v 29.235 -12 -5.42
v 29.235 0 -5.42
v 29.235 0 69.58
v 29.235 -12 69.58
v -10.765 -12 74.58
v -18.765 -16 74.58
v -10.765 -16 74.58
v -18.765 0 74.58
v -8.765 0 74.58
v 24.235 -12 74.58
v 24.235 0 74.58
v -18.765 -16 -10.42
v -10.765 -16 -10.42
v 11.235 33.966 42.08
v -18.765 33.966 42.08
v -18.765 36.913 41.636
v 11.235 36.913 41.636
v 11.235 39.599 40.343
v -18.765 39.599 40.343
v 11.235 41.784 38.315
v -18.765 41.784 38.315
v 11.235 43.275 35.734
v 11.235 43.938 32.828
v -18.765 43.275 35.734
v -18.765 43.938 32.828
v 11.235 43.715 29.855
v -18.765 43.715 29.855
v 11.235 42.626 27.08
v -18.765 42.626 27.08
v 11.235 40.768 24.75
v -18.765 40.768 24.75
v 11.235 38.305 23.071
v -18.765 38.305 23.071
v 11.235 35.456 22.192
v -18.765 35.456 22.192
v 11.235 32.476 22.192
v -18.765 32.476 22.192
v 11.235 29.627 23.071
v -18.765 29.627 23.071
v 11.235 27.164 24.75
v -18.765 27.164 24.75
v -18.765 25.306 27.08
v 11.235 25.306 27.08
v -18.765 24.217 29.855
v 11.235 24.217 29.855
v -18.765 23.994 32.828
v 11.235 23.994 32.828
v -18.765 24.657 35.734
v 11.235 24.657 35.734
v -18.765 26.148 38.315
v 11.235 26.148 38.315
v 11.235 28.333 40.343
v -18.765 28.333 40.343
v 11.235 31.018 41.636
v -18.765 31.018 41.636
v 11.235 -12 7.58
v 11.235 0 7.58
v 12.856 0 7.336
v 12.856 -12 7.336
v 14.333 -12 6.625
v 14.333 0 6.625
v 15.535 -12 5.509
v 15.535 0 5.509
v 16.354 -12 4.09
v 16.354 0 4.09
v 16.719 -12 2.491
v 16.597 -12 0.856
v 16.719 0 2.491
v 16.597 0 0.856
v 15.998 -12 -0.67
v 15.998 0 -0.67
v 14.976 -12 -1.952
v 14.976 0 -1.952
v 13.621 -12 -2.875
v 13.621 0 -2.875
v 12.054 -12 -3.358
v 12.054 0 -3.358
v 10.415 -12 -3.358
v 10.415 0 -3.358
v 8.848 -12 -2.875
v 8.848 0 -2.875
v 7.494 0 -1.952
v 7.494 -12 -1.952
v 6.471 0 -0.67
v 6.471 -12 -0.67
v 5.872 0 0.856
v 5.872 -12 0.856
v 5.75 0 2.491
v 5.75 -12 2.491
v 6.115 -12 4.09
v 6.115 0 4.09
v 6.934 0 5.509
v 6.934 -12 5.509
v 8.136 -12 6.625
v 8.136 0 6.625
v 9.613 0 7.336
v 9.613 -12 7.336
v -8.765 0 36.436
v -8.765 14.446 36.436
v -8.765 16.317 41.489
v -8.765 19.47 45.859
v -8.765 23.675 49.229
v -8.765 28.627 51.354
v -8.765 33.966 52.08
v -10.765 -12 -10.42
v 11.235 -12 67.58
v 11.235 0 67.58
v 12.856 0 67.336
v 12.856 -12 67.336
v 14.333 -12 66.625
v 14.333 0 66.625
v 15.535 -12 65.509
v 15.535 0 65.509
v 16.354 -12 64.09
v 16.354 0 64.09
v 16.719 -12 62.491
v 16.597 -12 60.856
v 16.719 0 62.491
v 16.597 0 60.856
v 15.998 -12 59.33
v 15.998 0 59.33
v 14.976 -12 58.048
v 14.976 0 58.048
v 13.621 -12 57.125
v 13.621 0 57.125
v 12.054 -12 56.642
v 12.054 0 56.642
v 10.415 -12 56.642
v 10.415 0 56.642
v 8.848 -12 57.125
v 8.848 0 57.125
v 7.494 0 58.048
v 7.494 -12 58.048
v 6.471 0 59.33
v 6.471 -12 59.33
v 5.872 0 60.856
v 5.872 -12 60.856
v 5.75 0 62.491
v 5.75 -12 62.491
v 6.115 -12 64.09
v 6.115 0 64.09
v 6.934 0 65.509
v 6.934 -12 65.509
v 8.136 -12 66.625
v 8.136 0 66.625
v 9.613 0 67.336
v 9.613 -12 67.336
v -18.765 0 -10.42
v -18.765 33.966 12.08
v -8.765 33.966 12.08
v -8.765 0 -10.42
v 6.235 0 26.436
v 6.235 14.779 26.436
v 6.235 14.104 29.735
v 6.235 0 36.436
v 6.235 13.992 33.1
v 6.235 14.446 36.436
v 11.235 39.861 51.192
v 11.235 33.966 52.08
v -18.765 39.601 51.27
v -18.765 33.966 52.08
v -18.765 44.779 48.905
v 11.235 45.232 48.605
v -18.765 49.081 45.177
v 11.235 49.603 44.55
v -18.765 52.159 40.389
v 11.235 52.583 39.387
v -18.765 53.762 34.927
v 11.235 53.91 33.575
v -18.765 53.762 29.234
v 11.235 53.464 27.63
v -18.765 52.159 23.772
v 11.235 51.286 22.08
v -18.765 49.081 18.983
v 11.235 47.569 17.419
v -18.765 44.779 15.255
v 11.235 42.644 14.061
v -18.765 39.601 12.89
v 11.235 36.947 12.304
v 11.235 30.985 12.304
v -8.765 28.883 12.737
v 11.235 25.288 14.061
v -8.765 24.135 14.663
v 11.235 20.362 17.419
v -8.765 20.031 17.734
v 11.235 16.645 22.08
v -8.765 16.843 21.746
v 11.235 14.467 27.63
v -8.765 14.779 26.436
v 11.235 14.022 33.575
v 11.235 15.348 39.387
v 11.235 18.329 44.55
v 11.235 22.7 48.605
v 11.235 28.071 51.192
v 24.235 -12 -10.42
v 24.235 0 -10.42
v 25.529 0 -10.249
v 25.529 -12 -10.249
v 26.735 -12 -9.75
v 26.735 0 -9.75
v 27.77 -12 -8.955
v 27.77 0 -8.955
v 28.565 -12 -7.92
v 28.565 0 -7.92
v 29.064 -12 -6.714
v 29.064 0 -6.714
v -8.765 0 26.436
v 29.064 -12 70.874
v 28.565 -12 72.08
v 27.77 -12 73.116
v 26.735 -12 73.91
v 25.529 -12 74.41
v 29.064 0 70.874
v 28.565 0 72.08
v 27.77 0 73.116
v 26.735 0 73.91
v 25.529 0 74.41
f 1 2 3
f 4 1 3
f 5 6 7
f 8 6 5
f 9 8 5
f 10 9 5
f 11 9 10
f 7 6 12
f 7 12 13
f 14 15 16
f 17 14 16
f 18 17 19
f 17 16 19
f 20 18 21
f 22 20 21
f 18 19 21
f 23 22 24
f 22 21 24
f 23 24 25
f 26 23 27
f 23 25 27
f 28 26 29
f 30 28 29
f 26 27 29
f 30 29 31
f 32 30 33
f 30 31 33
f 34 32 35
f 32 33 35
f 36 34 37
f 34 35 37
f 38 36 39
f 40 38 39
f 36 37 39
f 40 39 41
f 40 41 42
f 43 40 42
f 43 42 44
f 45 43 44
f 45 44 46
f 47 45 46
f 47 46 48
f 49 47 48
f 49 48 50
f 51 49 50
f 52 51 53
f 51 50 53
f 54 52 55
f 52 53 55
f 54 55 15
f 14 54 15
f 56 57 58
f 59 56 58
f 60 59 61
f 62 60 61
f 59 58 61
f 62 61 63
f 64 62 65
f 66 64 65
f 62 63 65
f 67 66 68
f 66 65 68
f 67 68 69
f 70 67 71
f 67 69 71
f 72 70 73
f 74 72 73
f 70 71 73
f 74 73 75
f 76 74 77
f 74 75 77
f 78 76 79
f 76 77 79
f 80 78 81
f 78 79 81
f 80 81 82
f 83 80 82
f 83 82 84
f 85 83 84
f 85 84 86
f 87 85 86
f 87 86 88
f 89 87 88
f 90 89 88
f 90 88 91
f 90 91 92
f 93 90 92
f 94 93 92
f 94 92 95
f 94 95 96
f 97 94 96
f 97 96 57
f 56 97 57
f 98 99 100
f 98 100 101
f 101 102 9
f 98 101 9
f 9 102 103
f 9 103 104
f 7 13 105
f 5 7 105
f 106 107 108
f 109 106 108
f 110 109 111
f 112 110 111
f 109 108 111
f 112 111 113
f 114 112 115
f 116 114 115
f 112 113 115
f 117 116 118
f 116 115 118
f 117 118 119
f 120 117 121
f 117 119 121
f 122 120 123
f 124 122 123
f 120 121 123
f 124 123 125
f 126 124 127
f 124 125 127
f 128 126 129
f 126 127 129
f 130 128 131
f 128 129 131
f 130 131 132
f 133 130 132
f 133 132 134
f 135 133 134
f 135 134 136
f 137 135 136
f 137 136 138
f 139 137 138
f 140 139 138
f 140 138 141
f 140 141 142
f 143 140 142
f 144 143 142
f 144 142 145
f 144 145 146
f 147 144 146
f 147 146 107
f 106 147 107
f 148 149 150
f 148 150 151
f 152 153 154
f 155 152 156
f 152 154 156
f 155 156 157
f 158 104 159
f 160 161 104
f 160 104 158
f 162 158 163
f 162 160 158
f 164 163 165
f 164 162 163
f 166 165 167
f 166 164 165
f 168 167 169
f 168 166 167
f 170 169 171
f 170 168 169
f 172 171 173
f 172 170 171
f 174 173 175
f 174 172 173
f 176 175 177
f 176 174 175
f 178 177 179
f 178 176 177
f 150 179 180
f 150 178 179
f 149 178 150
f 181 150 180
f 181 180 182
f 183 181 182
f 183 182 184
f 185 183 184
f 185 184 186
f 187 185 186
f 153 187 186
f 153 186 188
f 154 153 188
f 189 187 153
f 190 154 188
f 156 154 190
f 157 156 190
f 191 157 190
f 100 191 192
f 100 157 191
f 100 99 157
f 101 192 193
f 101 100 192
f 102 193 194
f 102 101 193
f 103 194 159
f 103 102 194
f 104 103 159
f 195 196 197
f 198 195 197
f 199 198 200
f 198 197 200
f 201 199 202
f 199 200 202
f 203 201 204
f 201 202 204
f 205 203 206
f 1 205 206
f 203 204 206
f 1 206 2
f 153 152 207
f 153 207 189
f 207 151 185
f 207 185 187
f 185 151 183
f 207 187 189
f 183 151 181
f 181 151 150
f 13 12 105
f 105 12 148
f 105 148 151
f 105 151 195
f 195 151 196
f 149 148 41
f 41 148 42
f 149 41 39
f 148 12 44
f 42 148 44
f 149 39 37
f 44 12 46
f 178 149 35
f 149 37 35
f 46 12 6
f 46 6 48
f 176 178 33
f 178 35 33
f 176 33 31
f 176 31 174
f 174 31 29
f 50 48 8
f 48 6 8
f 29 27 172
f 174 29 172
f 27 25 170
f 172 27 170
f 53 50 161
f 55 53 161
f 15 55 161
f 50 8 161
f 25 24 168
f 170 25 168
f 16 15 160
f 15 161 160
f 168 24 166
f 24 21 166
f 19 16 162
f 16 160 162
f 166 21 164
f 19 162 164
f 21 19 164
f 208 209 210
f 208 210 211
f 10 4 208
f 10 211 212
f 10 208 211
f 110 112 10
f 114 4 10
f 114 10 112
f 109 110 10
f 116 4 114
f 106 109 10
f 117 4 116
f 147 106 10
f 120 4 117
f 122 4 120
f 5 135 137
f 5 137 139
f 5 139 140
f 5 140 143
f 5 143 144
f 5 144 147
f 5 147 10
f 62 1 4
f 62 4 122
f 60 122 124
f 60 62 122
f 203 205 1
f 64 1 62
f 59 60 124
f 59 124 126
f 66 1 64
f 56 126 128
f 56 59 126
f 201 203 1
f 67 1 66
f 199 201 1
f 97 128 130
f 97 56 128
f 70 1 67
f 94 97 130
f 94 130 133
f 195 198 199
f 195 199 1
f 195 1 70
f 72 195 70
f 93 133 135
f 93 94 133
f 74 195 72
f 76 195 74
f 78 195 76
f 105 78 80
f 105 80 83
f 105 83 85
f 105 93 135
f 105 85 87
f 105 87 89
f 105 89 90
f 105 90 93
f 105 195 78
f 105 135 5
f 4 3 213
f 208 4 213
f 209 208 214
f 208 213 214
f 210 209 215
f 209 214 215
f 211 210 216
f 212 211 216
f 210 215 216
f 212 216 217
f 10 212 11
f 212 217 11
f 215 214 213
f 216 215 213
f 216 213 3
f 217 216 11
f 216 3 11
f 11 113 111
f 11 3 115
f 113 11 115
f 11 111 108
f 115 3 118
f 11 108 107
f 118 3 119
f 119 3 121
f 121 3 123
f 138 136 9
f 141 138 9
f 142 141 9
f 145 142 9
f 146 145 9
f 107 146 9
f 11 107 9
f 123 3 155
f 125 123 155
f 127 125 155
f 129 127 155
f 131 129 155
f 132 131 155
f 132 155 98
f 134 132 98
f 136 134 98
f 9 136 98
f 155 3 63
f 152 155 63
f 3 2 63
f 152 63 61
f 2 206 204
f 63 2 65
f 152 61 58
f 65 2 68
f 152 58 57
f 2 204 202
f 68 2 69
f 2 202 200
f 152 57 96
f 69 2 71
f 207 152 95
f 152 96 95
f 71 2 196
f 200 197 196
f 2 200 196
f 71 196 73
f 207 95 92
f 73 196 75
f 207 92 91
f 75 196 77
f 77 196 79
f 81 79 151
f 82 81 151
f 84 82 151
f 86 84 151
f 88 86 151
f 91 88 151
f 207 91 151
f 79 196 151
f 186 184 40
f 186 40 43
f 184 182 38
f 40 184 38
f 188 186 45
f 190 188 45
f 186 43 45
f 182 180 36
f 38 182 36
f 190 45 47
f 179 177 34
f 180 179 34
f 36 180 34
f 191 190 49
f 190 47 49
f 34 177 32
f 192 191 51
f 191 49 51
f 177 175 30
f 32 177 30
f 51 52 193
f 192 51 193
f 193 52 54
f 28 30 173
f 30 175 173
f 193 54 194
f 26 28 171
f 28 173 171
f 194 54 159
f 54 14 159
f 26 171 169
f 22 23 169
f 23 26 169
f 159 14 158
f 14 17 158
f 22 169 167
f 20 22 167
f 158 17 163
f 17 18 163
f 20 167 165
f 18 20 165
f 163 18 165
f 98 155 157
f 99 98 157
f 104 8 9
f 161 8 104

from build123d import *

# Parameters (mm, degrees)
BOSS_EXTRUDE1_DEPTH = 12
SKETCH3_R           = 20
SKETCH3_R_2         = 10
BOSS_EXTRUDE2_DEPTH = 30
BOSS_EXTRUDE3_DEPTH = 10
SKETCH5_R           = 5.5
CUT_EXTRUDE1_DEPTH  = 97.587759017
SKETCH6_W           = 8
SKETCH6_H           = 4
BOSS_EXTRUDE4_DEPTH = 85
SKETCH7_W           = 5
SKETCH7_H           = 20.431914742
BOSS_EXTRUDE5_DEPTH = 15


with BuildPart() as part:
    # Sketch2 → Boss-Extrude1 (new body)
    with BuildSketch(Plane(origin=(0, 0, 0), x_dir=(1, 0, 0), z_dir=(0, 1, 0))):
        with BuildLine():
            Line((-18.765432099, -74.580246914), (-18.765432099, 10.419753086))
            Line((-18.765432099, 10.419753086), (24.234567901, 10.419753086))
            ThreePointArc((24.234567901, 10.419753086), (27.770101807, 8.955286992), (29.234567901, 5.419753086))
            Line((29.234567901, 5.419753086), (29.234567901, -69.580246914))
            ThreePointArc((29.234567901, -69.580246914), (27.770101807, -73.11578082), (24.234567901, -74.580246914))
            Line((24.234567901, -74.580246914), (-18.765432099, -74.580246914))
        make_face()
    extrude(amount=-BOSS_EXTRUDE1_DEPTH)



with BuildPart() as body_2:
    # Sketch3 → Boss-Extrude2 (new body)
    with BuildSketch(Plane.ZY.offset(18.765432099)):
        with Locations((32.080246914, 33.965933716)):
            Circle(SKETCH3_R)
        with Locations((32.080246914, 33.965933716)):
            Circle(SKETCH3_R_2, mode=Mode.SUBTRACT)
    extrude(amount=-BOSS_EXTRUDE2_DEPTH)


with BuildPart() as part_1:
    add(part.part)

    add(body_2.part)  # Boss-Extrude3 merges body 2
    # Sketch4 → Boss-Extrude3 (add)
    with BuildSketch(Plane.ZY.offset(18.765432099)):
        with BuildLine():
            Line((12.080246914, 33.965933716), (-10.419753086, 0))
            Line((-10.419753086, 0), (74.580246914, 0))
            Line((74.580246914, 0), (52.080246914, 33.965933716))
            ThreePointArc((52.080246914, 33.965933716), (32.080246914, 13.965933716), (12.080246914, 33.965933716))
        make_face()
    extrude(amount=-BOSS_EXTRUDE3_DEPTH)

    # Sketch5 → Cut-Extrude1 (cut, through all)
    with BuildSketch(Plane(origin=(0, 0, 0), x_dir=(1, 0, 0), z_dir=(0, 1, 0))):
        with Locations(Location((11.234567901, -2.080246914, 0), (0, 0, 270))):
            Circle(SKETCH5_R)
        with Locations(Location((11.234567901, -62.080246914, 0), (0, 0, 270))):
            Circle(SKETCH5_R)
    extrude(amount=-CUT_EXTRUDE1_DEPTH, mode=Mode.SUBTRACT)

    # Sketch6 → Boss-Extrude4 (add)
    with BuildSketch(Plane.XY.offset(74.580246914)):
        with Locations((-14.765432099, -14)):
            Rectangle(SKETCH6_W, SKETCH6_H)
    extrude(amount=-BOSS_EXTRUDE4_DEPTH)

    # Sketch7 → Boss-Extrude5 (add)
    with BuildSketch(Plane.ZY.offset(8.765432099)):
        Polygon((36.436270076, 20.431914742), (31.436270076, 20.431914742), (31.436270076, 0), (36.436270076, 0), (36.436270076, 14.206805316), align=None)
        with Locations((28.936270076, 10.215957371)):
            Rectangle(SKETCH7_W, SKETCH7_H)
    extrude(amount=-BOSS_EXTRUDE5_DEPTH)


solid = part_1.part
